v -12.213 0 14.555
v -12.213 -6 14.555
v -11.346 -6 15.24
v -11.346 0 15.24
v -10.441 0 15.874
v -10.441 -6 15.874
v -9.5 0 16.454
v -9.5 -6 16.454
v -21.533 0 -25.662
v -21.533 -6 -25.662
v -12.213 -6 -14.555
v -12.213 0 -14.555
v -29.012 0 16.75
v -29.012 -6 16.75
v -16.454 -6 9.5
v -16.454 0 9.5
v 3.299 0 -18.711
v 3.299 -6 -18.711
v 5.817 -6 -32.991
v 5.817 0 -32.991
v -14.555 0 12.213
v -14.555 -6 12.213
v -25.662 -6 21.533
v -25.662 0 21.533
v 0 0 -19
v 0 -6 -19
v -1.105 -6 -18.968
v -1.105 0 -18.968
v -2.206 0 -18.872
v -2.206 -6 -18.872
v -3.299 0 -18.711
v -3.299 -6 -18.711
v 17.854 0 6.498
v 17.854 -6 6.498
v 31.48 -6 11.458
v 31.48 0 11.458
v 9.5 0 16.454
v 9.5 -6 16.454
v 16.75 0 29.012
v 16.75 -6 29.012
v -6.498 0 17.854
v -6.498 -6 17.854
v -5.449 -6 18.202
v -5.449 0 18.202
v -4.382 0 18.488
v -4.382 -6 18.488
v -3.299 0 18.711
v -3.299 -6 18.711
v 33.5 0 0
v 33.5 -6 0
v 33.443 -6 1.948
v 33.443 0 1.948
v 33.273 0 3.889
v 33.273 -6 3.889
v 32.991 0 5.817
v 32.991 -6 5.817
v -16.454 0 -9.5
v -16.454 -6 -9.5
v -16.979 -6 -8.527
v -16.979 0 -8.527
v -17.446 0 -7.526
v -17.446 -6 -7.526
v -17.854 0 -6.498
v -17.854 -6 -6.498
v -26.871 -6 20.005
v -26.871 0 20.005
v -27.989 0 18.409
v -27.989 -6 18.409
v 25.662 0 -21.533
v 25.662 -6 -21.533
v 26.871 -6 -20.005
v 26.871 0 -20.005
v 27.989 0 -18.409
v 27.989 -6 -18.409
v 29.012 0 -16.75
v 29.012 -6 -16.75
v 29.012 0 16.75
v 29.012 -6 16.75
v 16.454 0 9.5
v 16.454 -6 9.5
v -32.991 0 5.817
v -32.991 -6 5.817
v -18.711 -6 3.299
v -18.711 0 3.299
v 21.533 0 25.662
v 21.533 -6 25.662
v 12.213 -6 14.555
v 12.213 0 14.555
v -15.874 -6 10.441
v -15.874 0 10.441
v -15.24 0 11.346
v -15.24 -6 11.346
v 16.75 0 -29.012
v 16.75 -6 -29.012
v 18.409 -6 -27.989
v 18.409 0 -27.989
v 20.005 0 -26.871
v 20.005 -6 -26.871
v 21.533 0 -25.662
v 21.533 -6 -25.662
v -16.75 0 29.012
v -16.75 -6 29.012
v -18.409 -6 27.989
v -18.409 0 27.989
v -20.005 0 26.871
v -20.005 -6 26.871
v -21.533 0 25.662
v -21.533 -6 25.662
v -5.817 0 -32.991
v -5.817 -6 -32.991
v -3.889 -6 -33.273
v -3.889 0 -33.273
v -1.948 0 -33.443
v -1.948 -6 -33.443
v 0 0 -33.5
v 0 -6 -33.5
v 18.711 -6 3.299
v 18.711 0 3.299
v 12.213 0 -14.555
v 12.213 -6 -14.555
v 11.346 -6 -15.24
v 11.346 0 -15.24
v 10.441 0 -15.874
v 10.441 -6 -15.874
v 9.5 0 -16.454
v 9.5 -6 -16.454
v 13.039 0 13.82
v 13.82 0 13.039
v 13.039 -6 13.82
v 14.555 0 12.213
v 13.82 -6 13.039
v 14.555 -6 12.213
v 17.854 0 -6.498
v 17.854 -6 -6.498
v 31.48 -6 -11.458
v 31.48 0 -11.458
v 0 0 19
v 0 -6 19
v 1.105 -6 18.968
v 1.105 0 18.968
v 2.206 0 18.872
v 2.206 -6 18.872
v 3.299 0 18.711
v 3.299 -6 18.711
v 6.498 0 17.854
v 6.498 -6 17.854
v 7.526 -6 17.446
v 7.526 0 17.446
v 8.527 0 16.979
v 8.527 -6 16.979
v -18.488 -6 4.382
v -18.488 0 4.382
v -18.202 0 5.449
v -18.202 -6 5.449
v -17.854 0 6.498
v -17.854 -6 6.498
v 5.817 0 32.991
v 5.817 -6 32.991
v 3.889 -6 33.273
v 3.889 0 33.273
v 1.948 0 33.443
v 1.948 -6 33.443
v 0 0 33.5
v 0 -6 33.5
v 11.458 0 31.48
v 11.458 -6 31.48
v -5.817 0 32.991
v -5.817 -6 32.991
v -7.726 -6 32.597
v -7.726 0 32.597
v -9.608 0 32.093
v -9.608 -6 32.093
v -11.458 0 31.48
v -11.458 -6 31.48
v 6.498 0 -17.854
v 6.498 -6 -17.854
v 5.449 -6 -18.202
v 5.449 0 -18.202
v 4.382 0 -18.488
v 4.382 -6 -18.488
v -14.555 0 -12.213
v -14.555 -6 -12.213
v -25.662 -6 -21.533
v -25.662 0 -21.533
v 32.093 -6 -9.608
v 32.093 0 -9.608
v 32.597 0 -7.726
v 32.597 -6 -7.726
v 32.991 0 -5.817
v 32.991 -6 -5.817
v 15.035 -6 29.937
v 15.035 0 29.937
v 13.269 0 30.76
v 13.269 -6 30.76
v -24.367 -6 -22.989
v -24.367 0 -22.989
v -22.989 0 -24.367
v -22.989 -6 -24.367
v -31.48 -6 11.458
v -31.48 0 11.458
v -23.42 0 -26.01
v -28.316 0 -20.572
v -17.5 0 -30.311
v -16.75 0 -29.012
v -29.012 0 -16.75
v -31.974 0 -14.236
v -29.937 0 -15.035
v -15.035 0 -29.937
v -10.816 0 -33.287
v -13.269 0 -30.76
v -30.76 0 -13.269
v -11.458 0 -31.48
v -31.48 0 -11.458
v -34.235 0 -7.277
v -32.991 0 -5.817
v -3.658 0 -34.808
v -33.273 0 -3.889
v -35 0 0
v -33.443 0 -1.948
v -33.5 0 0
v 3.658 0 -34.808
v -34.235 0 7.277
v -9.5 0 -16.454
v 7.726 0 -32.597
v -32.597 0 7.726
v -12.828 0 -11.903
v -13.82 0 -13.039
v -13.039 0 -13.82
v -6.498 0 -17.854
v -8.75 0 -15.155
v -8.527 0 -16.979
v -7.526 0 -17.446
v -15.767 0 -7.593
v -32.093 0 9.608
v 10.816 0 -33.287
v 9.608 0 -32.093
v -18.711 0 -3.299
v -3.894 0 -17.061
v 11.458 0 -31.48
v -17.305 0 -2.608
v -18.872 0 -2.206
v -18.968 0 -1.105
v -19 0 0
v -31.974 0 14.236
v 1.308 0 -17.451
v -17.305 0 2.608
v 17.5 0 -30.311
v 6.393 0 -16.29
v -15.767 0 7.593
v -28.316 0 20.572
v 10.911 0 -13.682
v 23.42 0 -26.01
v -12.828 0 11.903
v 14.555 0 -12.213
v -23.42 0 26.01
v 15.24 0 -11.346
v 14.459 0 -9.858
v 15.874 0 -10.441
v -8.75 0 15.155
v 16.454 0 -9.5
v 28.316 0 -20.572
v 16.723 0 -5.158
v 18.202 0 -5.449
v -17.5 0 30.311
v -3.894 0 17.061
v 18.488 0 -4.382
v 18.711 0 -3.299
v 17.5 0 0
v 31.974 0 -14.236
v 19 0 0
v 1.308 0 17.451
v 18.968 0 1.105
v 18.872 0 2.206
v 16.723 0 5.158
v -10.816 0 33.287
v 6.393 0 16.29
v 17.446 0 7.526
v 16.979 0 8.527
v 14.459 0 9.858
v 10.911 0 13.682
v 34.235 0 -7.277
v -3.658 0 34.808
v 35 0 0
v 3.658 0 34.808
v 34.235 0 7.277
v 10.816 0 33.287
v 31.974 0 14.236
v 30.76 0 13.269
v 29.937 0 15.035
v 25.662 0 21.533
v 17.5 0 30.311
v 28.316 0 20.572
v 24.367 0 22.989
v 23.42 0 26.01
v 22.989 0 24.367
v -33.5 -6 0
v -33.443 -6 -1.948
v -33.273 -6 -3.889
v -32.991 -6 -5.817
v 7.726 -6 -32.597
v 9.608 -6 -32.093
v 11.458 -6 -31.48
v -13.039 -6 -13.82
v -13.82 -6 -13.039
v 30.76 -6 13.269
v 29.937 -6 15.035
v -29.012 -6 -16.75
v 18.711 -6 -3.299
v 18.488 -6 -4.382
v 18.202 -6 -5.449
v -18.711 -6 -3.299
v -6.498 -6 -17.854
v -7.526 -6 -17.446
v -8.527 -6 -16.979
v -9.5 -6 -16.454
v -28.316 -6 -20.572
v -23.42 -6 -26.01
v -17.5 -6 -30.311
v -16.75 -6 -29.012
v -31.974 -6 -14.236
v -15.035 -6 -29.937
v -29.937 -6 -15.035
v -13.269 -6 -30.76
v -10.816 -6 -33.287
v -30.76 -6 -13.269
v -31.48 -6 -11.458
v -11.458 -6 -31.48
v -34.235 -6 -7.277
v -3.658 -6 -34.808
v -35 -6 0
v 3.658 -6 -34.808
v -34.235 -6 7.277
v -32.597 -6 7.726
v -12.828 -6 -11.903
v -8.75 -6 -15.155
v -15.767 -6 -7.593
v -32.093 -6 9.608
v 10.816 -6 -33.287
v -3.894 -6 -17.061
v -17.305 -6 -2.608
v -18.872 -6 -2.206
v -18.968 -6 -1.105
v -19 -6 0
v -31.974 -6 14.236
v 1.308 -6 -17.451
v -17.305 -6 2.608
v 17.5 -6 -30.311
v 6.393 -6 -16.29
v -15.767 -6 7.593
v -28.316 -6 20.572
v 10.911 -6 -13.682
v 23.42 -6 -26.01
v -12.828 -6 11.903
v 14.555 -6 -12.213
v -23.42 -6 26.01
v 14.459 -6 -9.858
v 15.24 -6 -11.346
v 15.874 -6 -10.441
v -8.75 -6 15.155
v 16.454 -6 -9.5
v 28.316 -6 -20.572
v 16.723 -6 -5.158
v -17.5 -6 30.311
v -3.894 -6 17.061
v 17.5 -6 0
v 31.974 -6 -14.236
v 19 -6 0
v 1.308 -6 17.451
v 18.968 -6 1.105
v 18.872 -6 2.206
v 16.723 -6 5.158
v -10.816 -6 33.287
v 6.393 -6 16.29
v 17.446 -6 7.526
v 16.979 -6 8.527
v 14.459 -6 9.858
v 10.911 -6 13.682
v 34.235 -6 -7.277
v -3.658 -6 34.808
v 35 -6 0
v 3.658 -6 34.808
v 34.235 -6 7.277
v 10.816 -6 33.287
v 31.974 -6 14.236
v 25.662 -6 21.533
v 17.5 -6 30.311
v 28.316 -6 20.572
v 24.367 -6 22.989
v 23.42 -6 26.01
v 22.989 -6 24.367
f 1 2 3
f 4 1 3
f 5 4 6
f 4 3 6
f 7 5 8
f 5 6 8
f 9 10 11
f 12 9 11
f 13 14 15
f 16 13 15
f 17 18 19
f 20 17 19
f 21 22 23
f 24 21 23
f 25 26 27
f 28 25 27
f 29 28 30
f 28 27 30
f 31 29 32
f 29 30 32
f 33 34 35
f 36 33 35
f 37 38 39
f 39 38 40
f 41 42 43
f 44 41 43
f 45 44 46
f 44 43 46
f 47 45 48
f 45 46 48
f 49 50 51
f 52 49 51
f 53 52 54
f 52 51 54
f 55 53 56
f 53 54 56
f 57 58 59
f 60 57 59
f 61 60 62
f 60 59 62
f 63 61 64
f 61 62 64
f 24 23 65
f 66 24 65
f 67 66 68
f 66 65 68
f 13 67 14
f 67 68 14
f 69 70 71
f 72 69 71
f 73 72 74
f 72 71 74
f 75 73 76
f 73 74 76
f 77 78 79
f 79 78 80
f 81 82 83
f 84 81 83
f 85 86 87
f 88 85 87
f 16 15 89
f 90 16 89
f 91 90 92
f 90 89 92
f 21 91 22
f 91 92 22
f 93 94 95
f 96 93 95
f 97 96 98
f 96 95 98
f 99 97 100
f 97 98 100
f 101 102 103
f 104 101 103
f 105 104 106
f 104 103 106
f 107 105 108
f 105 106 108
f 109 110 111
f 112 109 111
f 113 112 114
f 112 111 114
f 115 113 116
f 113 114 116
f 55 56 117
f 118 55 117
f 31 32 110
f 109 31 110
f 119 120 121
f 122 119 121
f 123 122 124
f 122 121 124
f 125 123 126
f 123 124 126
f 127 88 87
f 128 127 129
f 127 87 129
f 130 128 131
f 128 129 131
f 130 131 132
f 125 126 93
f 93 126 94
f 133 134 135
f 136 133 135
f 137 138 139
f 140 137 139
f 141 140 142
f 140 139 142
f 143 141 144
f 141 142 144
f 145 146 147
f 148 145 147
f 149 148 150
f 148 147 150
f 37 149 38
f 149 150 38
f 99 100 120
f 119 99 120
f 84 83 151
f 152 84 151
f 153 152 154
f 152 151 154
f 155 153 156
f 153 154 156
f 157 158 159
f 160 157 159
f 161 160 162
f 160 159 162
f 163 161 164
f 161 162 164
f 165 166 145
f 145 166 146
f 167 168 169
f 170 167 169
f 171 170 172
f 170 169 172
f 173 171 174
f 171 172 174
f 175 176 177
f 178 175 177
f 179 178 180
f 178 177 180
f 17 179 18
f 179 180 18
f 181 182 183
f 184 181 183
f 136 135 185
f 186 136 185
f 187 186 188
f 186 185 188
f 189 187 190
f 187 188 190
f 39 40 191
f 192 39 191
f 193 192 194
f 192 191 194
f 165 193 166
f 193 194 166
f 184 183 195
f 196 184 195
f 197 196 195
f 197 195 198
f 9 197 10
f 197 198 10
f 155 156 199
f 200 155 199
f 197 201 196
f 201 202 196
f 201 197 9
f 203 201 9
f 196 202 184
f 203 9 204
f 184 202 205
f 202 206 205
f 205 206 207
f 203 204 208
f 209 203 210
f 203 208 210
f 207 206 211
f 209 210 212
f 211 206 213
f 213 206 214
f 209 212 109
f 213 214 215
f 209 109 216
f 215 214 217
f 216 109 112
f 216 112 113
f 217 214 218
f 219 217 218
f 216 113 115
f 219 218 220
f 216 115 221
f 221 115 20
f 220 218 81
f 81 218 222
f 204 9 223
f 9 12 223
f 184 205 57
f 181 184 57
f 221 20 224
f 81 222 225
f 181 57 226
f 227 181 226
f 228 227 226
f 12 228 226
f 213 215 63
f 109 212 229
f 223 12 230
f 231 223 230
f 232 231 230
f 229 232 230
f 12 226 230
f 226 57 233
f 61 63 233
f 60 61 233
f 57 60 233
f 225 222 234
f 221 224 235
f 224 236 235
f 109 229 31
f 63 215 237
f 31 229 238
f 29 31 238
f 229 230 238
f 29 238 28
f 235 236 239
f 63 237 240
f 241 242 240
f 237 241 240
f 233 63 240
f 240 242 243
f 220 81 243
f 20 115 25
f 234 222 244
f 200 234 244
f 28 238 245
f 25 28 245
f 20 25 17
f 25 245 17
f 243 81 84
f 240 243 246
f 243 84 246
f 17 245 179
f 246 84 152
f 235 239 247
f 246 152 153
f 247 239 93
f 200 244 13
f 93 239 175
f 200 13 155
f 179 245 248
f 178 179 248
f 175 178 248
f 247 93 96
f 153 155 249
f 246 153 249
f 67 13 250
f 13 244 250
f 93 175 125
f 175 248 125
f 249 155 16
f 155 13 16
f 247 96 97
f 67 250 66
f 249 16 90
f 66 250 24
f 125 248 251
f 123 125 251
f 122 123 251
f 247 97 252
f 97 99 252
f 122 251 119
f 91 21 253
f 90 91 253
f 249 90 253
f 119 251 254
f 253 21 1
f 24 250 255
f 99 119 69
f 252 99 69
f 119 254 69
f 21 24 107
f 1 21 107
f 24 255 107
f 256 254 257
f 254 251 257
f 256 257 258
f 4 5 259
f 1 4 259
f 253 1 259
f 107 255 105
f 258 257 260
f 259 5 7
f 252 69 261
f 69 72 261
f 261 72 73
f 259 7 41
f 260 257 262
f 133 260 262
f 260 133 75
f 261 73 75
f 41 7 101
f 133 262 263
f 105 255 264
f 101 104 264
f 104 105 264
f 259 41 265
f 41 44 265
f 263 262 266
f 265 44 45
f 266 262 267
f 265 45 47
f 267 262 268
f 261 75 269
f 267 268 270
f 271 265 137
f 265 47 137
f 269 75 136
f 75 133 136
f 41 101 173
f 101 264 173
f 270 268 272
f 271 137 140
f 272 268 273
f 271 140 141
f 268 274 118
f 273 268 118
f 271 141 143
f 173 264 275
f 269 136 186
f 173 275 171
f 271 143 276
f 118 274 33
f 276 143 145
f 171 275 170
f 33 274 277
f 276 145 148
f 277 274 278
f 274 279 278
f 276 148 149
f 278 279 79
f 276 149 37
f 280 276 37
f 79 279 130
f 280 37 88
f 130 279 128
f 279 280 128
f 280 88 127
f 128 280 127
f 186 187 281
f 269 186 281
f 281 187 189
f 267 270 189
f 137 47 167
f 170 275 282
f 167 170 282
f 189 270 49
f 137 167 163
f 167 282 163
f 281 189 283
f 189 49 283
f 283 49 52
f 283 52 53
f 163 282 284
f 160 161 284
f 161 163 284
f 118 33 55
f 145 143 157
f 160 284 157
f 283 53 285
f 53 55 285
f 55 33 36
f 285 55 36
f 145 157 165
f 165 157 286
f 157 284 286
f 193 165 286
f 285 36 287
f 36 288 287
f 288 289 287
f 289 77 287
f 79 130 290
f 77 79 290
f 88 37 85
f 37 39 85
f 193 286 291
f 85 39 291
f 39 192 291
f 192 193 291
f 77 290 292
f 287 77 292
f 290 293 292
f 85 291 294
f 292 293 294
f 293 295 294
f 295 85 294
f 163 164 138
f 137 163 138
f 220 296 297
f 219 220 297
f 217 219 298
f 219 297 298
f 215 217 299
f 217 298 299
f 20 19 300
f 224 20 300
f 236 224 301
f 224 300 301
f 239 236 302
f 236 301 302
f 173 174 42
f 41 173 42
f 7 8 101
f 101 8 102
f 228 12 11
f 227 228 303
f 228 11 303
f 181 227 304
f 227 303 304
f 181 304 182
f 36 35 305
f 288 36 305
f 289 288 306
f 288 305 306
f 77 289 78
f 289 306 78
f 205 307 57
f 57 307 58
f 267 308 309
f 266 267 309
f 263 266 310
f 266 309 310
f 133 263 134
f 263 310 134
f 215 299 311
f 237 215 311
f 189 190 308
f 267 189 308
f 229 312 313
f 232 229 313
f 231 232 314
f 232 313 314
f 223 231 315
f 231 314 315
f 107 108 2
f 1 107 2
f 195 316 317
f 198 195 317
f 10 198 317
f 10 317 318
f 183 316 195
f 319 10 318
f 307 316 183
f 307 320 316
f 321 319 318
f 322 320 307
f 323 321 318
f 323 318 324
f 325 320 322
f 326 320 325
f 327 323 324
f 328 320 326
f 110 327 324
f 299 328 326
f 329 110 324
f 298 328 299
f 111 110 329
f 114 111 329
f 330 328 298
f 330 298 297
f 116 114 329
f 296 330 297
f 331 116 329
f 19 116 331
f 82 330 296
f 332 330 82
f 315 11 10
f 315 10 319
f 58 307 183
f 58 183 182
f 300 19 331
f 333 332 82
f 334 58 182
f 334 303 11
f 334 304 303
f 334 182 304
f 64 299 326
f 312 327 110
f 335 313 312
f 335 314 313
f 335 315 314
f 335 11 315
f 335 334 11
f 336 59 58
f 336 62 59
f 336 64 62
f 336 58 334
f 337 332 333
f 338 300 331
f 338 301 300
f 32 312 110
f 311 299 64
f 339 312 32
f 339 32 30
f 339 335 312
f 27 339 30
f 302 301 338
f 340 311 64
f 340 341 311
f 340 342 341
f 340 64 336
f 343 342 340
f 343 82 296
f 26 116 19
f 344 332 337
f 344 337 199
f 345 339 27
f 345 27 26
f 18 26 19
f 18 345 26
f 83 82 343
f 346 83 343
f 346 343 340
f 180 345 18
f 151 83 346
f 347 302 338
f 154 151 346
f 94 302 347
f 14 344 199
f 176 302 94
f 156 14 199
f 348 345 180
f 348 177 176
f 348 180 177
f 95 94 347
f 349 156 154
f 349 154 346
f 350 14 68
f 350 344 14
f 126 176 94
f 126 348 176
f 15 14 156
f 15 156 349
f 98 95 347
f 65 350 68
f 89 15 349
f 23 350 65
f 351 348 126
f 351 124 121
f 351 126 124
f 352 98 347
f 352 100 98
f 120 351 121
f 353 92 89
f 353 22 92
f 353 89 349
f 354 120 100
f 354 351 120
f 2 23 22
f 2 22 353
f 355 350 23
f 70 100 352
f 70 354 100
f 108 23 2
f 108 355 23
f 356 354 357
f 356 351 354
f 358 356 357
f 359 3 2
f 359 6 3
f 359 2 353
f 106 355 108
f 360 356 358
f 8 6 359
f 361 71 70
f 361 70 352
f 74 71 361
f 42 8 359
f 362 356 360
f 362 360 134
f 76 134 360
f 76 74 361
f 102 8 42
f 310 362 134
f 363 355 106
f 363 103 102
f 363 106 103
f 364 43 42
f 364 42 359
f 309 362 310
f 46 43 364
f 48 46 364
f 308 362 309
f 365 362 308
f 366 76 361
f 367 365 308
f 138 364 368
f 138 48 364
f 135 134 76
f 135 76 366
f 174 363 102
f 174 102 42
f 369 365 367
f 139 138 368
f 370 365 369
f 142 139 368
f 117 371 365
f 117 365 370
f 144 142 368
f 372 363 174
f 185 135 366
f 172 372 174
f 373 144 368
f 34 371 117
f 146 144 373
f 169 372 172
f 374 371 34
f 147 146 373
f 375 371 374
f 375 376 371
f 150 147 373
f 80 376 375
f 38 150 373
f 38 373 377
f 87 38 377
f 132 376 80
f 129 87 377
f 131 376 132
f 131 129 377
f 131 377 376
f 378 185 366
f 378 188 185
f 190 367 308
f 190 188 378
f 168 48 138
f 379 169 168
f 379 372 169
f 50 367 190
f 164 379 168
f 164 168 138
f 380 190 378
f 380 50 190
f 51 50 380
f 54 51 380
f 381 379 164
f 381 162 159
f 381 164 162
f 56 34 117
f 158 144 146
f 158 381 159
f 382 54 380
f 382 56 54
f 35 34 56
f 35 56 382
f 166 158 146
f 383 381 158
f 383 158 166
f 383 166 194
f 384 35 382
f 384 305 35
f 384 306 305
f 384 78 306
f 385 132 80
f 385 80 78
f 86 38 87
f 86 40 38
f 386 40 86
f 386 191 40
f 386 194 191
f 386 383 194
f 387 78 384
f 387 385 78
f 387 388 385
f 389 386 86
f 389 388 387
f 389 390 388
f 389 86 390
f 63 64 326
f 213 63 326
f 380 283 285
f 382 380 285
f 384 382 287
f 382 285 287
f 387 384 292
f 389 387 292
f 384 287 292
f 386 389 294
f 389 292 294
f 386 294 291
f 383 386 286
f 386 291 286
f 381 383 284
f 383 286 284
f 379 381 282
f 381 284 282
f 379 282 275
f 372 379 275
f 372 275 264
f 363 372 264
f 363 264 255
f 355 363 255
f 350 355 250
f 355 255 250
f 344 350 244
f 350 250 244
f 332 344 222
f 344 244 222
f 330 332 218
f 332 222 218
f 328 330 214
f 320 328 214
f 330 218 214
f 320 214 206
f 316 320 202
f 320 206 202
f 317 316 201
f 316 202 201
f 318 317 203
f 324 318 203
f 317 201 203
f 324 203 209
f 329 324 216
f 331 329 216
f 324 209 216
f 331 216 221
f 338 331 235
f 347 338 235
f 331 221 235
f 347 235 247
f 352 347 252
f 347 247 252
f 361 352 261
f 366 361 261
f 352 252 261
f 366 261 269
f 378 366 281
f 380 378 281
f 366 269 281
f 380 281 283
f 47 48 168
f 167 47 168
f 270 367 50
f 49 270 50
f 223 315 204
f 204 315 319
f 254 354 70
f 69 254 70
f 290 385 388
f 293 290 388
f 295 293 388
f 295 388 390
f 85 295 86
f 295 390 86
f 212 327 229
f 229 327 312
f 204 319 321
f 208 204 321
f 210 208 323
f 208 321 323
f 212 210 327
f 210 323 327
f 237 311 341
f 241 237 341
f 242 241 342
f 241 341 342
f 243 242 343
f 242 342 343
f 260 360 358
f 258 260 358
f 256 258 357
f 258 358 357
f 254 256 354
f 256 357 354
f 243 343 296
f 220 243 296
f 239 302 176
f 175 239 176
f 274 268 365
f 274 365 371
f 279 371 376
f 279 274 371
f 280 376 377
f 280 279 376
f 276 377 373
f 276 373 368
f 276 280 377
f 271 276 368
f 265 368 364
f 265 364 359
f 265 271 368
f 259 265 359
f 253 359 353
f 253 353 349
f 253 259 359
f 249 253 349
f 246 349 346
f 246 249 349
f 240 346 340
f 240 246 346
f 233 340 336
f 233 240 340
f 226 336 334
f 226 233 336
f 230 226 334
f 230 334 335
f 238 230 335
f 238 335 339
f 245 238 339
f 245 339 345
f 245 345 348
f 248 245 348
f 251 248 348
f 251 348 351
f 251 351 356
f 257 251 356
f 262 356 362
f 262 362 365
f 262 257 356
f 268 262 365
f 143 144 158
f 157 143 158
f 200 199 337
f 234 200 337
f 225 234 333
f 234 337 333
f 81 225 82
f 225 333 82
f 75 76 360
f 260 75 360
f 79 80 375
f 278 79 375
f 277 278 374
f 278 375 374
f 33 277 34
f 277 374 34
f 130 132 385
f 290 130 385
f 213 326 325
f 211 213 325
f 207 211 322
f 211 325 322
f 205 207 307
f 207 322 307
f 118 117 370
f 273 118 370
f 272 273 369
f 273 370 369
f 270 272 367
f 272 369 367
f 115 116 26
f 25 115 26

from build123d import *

# Parameters (mm, degrees)
F0_R     = 35
F0_R_2   = 17.5
F1_DEPTH = 6
F3_DEPTH = 6.001


with BuildPart() as f1:
    # F0 (on Front) → F1 (new body)
    with BuildSketch(Plane.XZ):
        Circle(F0_R)
        Circle(F0_R_2, mode=Mode.SUBTRACT)
    extrude(amount=F1_DEPTH)

    # F2 (on face) → F3 (cut, through all)
    with BuildSketch(Plane.XZ.offset(6)):
        with BuildLine():
            ThreePointArc((16.454483, -9.5), (15.563889, -10.897952), (14.554844, -12.212965))
            Line((14.554844, -12.212965), (25.662489, -21.533385))
            ThreePointArc((25.662489, -21.533385), (27.441593, -19.214811), (29.011851, -16.75))
            Line((29.011851, -16.75), (16.454483, -9.5))
        make_face()
        with BuildLine():
            ThreePointArc((18.711347, -3.299315), (18.352591, -4.917562), (17.85416, -6.498383))
            Line((17.85416, -6.498383), (31.479703, -11.457675))
            ThreePointArc((31.479703, -11.457675), (32.358515, -8.670438), (32.99106, -5.817214))
            Line((32.99106, -5.817214), (18.711347, -3.299315))
        make_face()
        with BuildLine():
            ThreePointArc((18.711347, 3.299315), (18.927699, 1.655959), (19, 0))
            Line((19, 0), (33.5, 0))
            ThreePointArc((33.5, 0), (33.372522, 2.919717), (32.99106, 5.817214))
            Line((32.99106, 5.817214), (18.711347, 3.299315))
        make_face()
        with BuildLine():
            ThreePointArc((16.454483, 9.5), (17.219848, 8.029747), (17.85416, 6.498383))
            Line((17.85416, 6.498383), (31.479703, 11.457675))
            ThreePointArc((31.479703, 11.457675), (30.361311, 14.157712), (29.011851, 16.75))
            Line((29.011851, 16.75), (16.454483, 9.5))
        make_face()
        with BuildLine():
            ThreePointArc((6.498383, 17.85416), (8.029747, 17.219848), (9.5, 16.454483))
            Line((9.5, 16.454483), (16.75, 29.011851))
            ThreePointArc((16.75, 29.011851), (14.157712, 30.361311), (11.457675, 31.479703))
            Line((11.457675, 31.479703), (6.498383, 17.85416))
        make_face()
        with BuildLine():
            ThreePointArc((12.212965, 14.554844), (13.435029, 13.435029), (14.554844, 12.212965))
            Line((14.554844, 12.212965), (25.662489, 21.533385))
            ThreePointArc((25.662489, 21.533385), (23.688077, 23.688077), (21.533385, 25.662489))
            Line((21.533385, 25.662489), (12.212965, 14.554844))
        make_face()
        with BuildLine():
            ThreePointArc((0, 19), (1.655959, 18.927699), (3.299315, 18.711347))
            Line((3.299315, 18.711347), (5.817214, 32.99106))
            ThreePointArc((5.817214, 32.99106), (2.919717, 33.372522), (0, 33.5))
            Line((0, 33.5), (0, 19))
        make_face()
        with BuildLine():
            ThreePointArc((-6.498383, 17.85416), (-4.917562, 18.352591), (-3.299315, 18.711347))
            Line((-3.299315, 18.711347), (-5.817214, 32.99106))
            ThreePointArc((-5.817214, 32.99106), (-8.670438, 32.358515), (-11.457675, 31.479703))
            Line((-11.457675, 31.479703), (-6.498383, 17.85416))
        make_face()
        with BuildLine():
            ThreePointArc((-12.212965, 14.554844), (-10.897952, 15.563889), (-9.5, 16.454483))
            Line((-9.5, 16.454483), (-16.75, 29.011851))
            ThreePointArc((-16.75, 29.011851), (-19.214811, 27.441593), (-21.533385, 25.662489))
            Line((-21.533385, 25.662489), (-12.212965, 14.554844))
        make_face()
        with BuildLine():
            ThreePointArc((-16.454483, 9.5), (-15.563889, 10.897952), (-14.554844, 12.212965))
            Line((-14.554844, 12.212965), (-25.662489, 21.533385))
            ThreePointArc((-25.662489, 21.533385), (-27.441593, 19.214811), (-29.011851, 16.75))
            Line((-29.011851, 16.75), (-16.454483, 9.5))
        make_face()
        with BuildLine():
            ThreePointArc((-18.711347, 3.299315), (-18.352591, 4.917562), (-17.85416, 6.498383))
            Line((-17.85416, 6.498383), (-31.479703, 11.457675))
            ThreePointArc((-31.479703, 11.457675), (-32.358515, 8.670438), (-32.99106, 5.817214))
            Line((-32.99106, 5.817214), (-18.711347, 3.299315))
        make_face()
        with BuildLine():
            ThreePointArc((-12.212965, -14.554844), (-13.435029, -13.435029), (-14.554844, -12.212965))
            Line((-14.554844, -12.212965), (-25.662489, -21.533385))
            ThreePointArc((-25.662489, -21.533385), (-23.688077, -23.688077), (-21.533385, -25.662489))
            Line((-21.533385, -25.662489), (-12.212965, -14.554844))
        make_face()
        with BuildLine():
            ThreePointArc((-18.711347, -3.299315), (-18.927699, -1.655959), (-19, 0))
            Line((-19, 0), (-33.5, 0))
            ThreePointArc((-33.5, 0), (-33.372522, -2.919717), (-32.99106, -5.817214))
            Line((-32.99106, -5.817214), (-18.711347, -3.299315))
        make_face()
        with BuildLine():
            ThreePointArc((-16.454483, -9.5), (-17.219848, -8.029747), (-17.85416, -6.498383))
            Line((-17.85416, -6.498383), (-31.479703, -11.457675))
            ThreePointArc((-31.479703, -11.457675), (-30.361311, -14.157712), (-29.011851, -16.75))
            Line((-29.011851, -16.75), (-16.454483, -9.5))
        make_face()
        with BuildLine():
            ThreePointArc((0, -19), (-1.655959, -18.927699), (-3.299315, -18.711347))
            Line((-3.299315, -18.711347), (-5.817214, -32.99106))
            ThreePointArc((-5.817214, -32.99106), (-2.919717, -33.372522), (0, -33.5))
            Line((0, -33.5), (0, -19))
        make_face()
        with BuildLine():
            ThreePointArc((-6.498383, -17.85416), (-8.029747, -17.219848), (-9.5, -16.454483))
            Line((-9.5, -16.454483), (-16.75, -29.011851))
            ThreePointArc((-16.75, -29.011851), (-14.157712, -30.361311), (-11.457675, -31.479703))
            Line((-11.457675, -31.479703), (-6.498383, -17.85416))
        make_face()
        with BuildLine():
            ThreePointArc((6.498383, -17.85416), (4.917562, -18.352591), (3.299315, -18.711347))
            Line((3.299315, -18.711347), (5.817214, -32.99106))
            ThreePointArc((5.817214, -32.99106), (8.670438, -32.358515), (11.457675, -31.479703))
            Line((11.457675, -31.479703), (6.498383, -17.85416))
        make_face()
        with BuildLine():
            ThreePointArc((12.212965, -14.554844), (10.897952, -15.563889), (9.5, -16.454483))
            Line((9.5, -16.454483), (16.75, -29.011851))
            ThreePointArc((16.75, -29.011851), (19.214811, -27.441593), (21.533385, -25.662489))
            Line((21.533385, -25.662489), (12.212965, -14.554844))
        make_face()
    extrude(amount=-F3_DEPTH, mode=Mode.SUBTRACT)


solid = f1.part
